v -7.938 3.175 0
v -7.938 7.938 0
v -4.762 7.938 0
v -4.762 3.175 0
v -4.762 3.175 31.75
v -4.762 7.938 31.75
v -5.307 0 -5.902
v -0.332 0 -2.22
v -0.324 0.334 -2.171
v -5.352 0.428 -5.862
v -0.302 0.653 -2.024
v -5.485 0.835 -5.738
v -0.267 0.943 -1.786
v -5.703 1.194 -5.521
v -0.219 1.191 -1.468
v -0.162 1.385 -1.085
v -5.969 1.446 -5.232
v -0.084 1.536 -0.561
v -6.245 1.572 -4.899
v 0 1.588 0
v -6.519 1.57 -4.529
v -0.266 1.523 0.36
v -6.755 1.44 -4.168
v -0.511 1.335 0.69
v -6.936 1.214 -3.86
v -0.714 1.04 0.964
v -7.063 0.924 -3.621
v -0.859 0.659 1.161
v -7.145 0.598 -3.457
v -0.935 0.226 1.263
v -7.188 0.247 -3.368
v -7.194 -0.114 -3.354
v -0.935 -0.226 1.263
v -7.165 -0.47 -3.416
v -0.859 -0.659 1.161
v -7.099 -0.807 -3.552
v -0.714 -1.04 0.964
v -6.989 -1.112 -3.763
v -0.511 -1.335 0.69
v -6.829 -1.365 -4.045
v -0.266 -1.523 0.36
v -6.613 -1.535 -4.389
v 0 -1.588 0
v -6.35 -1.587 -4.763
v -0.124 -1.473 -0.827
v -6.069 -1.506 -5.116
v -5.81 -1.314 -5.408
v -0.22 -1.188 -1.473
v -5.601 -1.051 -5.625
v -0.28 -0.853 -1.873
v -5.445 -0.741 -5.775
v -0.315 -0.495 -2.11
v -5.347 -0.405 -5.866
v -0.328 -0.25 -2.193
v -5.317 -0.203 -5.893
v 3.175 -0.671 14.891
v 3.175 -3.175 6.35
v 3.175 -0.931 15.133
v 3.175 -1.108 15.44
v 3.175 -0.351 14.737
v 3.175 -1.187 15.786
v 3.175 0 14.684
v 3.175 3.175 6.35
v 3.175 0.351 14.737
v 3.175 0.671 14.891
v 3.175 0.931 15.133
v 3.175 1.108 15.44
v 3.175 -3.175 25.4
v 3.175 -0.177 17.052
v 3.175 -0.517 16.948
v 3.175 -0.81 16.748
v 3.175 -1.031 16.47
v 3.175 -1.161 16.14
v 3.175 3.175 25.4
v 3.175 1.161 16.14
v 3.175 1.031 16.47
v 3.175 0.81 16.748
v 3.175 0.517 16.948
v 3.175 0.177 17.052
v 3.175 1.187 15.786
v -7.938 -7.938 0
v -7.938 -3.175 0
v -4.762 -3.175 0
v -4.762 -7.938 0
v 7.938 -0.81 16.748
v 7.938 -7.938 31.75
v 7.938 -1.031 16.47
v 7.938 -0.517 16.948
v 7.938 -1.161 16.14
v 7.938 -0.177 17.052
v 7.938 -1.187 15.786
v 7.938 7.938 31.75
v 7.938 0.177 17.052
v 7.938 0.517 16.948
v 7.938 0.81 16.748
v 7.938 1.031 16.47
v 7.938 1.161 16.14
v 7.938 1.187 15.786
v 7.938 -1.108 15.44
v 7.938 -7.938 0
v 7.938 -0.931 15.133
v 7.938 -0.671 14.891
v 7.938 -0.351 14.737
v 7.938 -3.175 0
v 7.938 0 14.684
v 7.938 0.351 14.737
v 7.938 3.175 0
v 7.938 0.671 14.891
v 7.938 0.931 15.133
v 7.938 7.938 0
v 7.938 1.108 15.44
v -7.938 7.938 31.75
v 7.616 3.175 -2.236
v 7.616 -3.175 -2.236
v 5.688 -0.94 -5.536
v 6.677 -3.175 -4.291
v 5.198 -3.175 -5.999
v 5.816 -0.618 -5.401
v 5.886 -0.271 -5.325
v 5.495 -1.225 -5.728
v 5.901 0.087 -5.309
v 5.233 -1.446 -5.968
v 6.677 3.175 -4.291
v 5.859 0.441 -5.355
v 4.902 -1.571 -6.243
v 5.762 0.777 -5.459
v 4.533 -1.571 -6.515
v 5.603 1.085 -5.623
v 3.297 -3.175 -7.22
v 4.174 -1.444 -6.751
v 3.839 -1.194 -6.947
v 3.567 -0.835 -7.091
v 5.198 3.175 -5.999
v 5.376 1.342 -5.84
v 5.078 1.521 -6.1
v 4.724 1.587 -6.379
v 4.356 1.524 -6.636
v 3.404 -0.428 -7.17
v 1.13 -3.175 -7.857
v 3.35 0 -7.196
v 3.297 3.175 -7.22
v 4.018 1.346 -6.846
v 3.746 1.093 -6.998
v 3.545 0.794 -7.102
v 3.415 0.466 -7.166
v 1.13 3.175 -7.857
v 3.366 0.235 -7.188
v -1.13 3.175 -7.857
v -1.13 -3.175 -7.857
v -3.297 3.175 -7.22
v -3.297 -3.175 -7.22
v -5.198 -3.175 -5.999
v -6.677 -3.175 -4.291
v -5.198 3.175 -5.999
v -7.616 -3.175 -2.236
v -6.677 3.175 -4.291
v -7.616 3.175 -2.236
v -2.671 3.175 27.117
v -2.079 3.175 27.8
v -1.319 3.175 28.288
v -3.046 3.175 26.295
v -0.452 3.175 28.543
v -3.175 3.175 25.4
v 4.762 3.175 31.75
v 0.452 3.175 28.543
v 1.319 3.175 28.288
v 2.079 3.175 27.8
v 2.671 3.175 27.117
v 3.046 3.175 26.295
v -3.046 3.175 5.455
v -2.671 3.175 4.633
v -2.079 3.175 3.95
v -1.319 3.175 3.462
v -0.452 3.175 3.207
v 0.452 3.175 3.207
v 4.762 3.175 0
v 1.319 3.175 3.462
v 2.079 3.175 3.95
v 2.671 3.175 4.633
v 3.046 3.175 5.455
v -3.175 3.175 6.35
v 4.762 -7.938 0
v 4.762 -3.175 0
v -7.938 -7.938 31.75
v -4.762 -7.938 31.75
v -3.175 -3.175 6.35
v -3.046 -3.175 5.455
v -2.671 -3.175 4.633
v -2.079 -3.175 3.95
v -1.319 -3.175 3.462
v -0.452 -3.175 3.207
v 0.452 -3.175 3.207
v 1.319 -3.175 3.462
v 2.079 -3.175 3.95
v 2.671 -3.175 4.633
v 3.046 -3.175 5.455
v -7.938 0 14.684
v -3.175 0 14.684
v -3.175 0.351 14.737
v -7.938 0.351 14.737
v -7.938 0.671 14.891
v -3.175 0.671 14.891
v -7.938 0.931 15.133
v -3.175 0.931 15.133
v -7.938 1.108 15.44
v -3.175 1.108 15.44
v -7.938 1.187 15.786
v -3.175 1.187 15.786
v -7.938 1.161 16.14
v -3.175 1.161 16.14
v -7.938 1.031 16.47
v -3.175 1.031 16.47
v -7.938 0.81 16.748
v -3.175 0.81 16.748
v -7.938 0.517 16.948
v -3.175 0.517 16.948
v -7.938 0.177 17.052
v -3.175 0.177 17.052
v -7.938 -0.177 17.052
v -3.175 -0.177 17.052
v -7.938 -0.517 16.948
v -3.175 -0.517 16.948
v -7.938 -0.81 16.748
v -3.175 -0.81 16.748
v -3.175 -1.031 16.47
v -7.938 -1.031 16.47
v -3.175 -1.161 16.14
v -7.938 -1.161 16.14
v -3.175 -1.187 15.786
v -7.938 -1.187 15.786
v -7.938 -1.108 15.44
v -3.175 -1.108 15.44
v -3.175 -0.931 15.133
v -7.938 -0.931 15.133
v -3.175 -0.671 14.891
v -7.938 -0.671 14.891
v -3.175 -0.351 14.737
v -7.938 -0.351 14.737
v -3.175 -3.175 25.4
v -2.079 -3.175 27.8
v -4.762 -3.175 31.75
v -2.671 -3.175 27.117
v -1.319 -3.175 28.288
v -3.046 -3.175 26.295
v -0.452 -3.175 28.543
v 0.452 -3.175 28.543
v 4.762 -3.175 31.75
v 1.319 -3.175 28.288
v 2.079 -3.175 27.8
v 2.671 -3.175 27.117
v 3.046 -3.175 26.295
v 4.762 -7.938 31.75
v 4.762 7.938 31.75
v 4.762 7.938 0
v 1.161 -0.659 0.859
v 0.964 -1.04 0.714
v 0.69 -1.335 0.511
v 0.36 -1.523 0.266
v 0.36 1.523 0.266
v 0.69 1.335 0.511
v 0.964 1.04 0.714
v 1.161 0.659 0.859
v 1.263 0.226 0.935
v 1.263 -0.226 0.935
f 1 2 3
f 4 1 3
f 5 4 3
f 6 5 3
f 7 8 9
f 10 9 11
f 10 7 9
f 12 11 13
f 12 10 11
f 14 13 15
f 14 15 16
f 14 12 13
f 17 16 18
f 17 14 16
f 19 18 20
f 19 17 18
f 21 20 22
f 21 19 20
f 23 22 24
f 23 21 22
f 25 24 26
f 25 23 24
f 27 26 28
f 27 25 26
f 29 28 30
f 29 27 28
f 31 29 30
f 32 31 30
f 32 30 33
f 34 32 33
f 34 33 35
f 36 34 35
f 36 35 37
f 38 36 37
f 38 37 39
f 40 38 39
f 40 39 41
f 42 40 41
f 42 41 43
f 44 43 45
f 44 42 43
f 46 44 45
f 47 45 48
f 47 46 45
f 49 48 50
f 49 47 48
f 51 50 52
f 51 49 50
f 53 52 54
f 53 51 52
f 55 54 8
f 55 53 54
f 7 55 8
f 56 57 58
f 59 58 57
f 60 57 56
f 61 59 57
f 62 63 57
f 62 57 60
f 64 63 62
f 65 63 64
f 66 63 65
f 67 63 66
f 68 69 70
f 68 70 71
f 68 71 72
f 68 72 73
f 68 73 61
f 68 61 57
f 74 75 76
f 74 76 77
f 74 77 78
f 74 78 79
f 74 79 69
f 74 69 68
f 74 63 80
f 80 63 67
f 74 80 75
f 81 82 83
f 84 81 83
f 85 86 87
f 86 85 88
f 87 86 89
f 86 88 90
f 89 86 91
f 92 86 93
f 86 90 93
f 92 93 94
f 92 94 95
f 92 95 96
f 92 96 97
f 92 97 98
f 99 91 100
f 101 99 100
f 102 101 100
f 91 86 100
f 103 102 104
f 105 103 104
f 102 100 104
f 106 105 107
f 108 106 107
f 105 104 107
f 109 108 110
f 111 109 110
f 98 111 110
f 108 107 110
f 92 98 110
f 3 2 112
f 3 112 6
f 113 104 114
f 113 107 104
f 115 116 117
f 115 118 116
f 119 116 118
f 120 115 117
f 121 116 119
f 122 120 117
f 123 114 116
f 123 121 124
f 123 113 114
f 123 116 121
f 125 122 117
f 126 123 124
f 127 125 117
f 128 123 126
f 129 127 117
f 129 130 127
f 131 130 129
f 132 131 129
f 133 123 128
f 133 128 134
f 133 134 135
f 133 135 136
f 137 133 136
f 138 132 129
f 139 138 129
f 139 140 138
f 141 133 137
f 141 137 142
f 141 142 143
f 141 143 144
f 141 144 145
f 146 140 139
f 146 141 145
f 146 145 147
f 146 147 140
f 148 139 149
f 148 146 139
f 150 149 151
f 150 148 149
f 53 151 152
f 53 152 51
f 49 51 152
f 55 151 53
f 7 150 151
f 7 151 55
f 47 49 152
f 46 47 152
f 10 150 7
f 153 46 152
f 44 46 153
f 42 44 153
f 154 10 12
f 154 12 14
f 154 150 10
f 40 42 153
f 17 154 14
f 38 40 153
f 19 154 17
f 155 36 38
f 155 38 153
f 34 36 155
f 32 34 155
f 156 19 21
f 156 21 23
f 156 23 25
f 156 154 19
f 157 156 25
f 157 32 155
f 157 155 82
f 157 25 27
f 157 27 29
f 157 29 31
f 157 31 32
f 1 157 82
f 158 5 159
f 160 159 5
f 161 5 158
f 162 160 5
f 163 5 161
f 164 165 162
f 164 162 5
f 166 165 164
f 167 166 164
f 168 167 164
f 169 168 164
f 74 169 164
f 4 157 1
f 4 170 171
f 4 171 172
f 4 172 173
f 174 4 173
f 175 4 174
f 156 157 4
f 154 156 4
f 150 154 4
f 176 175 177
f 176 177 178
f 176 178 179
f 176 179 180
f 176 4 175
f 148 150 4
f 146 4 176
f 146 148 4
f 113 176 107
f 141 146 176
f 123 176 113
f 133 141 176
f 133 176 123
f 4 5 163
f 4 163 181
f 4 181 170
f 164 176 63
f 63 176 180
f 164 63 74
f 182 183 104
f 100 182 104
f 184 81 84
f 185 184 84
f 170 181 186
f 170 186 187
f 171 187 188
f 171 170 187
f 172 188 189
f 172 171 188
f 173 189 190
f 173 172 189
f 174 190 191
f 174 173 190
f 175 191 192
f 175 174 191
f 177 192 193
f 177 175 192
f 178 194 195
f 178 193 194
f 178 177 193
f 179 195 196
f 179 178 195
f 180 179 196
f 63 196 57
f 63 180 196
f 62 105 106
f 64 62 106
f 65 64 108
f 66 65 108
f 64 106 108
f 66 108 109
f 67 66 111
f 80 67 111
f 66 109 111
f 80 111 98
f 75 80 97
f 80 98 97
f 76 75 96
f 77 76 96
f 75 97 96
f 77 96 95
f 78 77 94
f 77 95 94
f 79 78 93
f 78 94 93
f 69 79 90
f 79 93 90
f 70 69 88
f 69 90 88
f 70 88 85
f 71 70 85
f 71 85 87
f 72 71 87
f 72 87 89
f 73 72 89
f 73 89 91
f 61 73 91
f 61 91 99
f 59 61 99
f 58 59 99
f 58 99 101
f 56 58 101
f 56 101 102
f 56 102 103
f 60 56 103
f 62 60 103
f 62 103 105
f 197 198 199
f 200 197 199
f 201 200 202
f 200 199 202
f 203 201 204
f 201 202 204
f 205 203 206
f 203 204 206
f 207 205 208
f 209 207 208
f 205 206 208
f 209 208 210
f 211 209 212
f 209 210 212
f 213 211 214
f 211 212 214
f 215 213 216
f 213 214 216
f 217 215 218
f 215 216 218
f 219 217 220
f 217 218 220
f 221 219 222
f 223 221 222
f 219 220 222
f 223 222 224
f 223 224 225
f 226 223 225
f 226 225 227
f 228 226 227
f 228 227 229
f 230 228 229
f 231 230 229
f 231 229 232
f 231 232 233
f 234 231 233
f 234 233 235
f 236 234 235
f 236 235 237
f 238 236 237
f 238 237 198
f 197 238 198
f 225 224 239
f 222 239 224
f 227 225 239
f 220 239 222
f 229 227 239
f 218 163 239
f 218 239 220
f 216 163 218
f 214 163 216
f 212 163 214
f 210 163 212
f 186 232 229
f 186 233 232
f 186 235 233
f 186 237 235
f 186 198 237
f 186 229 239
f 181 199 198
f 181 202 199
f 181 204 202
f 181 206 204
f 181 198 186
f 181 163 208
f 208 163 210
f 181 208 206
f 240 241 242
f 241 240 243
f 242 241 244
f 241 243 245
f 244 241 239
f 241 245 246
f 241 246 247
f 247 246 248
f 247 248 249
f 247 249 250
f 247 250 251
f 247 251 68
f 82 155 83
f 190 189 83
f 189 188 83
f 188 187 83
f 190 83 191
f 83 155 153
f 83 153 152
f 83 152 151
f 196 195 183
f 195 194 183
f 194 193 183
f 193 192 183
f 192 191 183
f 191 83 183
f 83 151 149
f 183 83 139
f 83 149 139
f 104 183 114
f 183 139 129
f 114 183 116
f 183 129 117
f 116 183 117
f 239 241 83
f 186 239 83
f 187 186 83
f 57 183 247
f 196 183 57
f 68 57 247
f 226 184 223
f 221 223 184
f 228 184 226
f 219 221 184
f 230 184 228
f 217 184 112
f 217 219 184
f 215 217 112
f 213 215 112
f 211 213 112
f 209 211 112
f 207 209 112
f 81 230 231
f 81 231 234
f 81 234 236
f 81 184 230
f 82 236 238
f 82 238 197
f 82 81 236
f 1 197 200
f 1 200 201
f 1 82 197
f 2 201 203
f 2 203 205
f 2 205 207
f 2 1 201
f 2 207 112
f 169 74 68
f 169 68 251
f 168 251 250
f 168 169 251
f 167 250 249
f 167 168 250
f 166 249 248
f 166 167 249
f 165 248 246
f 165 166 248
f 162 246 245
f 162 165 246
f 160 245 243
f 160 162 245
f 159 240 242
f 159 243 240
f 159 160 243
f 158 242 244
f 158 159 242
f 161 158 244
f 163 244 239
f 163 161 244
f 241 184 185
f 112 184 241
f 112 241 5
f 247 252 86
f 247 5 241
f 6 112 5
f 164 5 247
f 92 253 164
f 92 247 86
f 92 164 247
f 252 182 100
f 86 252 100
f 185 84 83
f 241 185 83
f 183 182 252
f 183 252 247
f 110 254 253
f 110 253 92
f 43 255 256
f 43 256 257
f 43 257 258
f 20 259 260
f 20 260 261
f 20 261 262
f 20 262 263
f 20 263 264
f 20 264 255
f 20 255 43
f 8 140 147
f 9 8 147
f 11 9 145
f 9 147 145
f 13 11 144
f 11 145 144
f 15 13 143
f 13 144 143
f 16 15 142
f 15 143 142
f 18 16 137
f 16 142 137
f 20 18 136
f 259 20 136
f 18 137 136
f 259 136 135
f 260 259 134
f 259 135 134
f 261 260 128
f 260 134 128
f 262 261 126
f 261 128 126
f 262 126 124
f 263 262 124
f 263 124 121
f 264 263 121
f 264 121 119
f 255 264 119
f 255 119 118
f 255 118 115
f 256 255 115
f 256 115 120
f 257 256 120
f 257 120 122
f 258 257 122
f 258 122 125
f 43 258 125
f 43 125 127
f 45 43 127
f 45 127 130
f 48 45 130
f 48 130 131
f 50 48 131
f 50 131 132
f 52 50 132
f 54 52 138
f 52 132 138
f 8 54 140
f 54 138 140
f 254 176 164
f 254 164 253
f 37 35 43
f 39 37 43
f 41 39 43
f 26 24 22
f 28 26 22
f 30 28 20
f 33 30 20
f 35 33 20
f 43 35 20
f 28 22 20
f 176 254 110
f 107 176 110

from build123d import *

# Parameters (mm, degrees)
SKETCH1_W                = 15.875
SKETCH1_H                = 15.875
BOSS_EXTRUDE1_DEPTH      = 31.75
BOSS_EXTRUDE3_DEPTH      = 3.175
BOSS_EXTRUDE3_DEPTH_BACK = 3.175
SKETCH4_R                = 1.190625
CUT_EXTRUDE1_DEPTH       = 16.875
SKETCH8_R                = 1.5875
CUT_EXTRUDE3_DEPTH       = 7.9375
SKETCH7_R                = 1.5875
CUT_EXTRUDE4_DEPTH       = 7.9375
SKETCH10_W               = 9.525
SKETCH10_H               = 4.7625
CUT_EXTRUDE5_DEPTH       = 32.75
CUT_EXTRUDE6_DEPTH       = 12.1125


with BuildPart() as part:
    # Sketch1 → Boss-Extrude1 (new body)
    with BuildSketch(Plane.XY):
        Rectangle(SKETCH1_W, SKETCH1_H)
    extrude(amount=BOSS_EXTRUDE1_DEPTH)

    # Sketch3 → Boss-Extrude3 (add, two sides)
    with BuildSketch(Plane(origin=(0, 0, 0), x_dir=(1, 0, 0), z_dir=(0, 1, 0))) as boss_extrude3_sk:
        with BuildLine():
            Line((-7.9375, 0), (7.9375, 0))
            ThreePointArc((7.9375, 0), (0, 7.9375), (-7.9375, 0))
        make_face()
    extrude(amount=BOSS_EXTRUDE3_DEPTH)
    extrude(boss_extrude3_sk.sketch, amount=-BOSS_EXTRUDE3_DEPTH_BACK)

    # Sketch4 → Cut-Extrude1 (cut, through all)
    with BuildSketch(Plane(origin=(7.9375, 0, 0), x_dir=(0, 0, -1), z_dir=(1, 0, 0))):
        with Locations((-15.875, 0)):
            Circle(SKETCH4_R)
    extrude(amount=-CUT_EXTRUDE1_DEPTH, mode=Mode.SUBTRACT)

    # Sketch8 → Cut-Extrude3 (cut)
    with BuildSketch(Plane(origin=(4.72140587, 0, -6.380613831), x_dir=(-0.803856861, 0, -0.594822787), z_dir=(0.594822787, 0, -0.803856861))):
        Circle(SKETCH8_R)
    extrude(amount=-CUT_EXTRUDE3_DEPTH, mode=Mode.SUBTRACT)

    # Sketch7 → Cut-Extrude4 (cut)
    with BuildSketch(Plane(origin=(-6.380613831, 0, -4.72140587), x_dir=(0.594822787, 0, -0.803856861), z_dir=(0.803856861, 0, 0.594822787))):
        Circle(SKETCH7_R)
    extrude(amount=CUT_EXTRUDE4_DEPTH, mode=Mode.SUBTRACT)

    # Sketch10 → Cut-Extrude5 (cut, through all)
    with BuildSketch(Plane(origin=(0, 0, 0), x_dir=(-1, 0, 0), z_dir=(0, 0, -1))):
        with Locations((0, 5.55625)):
            Rectangle(SKETCH10_W, SKETCH10_H)
        with Locations((0, -5.55625)):
            Rectangle(SKETCH10_W, SKETCH10_H)
    extrude(amount=-CUT_EXTRUDE5_DEPTH, mode=Mode.SUBTRACT)

    # Sketch12 → Cut-Extrude6 (cut, through all)
    with BuildSketch(Plane(origin=(0, 3.175, 0), x_dir=(1, 0, 0), z_dir=(0, 1, 0))):
        with BuildLine():
            Line((-3.175, -25.4), (-3.175, -6.35))
            ThreePointArc((-3.175, -6.35), (0, -3.175), (3.175, -6.35))
            Line((3.175, -6.35), (3.175, -25.4))
            ThreePointArc((3.175, -25.4), (0, -28.575), (-3.175, -25.4))
        make_face()
    extrude(amount=-CUT_EXTRUDE6_DEPTH, mode=Mode.SUBTRACT)


solid = part.part
